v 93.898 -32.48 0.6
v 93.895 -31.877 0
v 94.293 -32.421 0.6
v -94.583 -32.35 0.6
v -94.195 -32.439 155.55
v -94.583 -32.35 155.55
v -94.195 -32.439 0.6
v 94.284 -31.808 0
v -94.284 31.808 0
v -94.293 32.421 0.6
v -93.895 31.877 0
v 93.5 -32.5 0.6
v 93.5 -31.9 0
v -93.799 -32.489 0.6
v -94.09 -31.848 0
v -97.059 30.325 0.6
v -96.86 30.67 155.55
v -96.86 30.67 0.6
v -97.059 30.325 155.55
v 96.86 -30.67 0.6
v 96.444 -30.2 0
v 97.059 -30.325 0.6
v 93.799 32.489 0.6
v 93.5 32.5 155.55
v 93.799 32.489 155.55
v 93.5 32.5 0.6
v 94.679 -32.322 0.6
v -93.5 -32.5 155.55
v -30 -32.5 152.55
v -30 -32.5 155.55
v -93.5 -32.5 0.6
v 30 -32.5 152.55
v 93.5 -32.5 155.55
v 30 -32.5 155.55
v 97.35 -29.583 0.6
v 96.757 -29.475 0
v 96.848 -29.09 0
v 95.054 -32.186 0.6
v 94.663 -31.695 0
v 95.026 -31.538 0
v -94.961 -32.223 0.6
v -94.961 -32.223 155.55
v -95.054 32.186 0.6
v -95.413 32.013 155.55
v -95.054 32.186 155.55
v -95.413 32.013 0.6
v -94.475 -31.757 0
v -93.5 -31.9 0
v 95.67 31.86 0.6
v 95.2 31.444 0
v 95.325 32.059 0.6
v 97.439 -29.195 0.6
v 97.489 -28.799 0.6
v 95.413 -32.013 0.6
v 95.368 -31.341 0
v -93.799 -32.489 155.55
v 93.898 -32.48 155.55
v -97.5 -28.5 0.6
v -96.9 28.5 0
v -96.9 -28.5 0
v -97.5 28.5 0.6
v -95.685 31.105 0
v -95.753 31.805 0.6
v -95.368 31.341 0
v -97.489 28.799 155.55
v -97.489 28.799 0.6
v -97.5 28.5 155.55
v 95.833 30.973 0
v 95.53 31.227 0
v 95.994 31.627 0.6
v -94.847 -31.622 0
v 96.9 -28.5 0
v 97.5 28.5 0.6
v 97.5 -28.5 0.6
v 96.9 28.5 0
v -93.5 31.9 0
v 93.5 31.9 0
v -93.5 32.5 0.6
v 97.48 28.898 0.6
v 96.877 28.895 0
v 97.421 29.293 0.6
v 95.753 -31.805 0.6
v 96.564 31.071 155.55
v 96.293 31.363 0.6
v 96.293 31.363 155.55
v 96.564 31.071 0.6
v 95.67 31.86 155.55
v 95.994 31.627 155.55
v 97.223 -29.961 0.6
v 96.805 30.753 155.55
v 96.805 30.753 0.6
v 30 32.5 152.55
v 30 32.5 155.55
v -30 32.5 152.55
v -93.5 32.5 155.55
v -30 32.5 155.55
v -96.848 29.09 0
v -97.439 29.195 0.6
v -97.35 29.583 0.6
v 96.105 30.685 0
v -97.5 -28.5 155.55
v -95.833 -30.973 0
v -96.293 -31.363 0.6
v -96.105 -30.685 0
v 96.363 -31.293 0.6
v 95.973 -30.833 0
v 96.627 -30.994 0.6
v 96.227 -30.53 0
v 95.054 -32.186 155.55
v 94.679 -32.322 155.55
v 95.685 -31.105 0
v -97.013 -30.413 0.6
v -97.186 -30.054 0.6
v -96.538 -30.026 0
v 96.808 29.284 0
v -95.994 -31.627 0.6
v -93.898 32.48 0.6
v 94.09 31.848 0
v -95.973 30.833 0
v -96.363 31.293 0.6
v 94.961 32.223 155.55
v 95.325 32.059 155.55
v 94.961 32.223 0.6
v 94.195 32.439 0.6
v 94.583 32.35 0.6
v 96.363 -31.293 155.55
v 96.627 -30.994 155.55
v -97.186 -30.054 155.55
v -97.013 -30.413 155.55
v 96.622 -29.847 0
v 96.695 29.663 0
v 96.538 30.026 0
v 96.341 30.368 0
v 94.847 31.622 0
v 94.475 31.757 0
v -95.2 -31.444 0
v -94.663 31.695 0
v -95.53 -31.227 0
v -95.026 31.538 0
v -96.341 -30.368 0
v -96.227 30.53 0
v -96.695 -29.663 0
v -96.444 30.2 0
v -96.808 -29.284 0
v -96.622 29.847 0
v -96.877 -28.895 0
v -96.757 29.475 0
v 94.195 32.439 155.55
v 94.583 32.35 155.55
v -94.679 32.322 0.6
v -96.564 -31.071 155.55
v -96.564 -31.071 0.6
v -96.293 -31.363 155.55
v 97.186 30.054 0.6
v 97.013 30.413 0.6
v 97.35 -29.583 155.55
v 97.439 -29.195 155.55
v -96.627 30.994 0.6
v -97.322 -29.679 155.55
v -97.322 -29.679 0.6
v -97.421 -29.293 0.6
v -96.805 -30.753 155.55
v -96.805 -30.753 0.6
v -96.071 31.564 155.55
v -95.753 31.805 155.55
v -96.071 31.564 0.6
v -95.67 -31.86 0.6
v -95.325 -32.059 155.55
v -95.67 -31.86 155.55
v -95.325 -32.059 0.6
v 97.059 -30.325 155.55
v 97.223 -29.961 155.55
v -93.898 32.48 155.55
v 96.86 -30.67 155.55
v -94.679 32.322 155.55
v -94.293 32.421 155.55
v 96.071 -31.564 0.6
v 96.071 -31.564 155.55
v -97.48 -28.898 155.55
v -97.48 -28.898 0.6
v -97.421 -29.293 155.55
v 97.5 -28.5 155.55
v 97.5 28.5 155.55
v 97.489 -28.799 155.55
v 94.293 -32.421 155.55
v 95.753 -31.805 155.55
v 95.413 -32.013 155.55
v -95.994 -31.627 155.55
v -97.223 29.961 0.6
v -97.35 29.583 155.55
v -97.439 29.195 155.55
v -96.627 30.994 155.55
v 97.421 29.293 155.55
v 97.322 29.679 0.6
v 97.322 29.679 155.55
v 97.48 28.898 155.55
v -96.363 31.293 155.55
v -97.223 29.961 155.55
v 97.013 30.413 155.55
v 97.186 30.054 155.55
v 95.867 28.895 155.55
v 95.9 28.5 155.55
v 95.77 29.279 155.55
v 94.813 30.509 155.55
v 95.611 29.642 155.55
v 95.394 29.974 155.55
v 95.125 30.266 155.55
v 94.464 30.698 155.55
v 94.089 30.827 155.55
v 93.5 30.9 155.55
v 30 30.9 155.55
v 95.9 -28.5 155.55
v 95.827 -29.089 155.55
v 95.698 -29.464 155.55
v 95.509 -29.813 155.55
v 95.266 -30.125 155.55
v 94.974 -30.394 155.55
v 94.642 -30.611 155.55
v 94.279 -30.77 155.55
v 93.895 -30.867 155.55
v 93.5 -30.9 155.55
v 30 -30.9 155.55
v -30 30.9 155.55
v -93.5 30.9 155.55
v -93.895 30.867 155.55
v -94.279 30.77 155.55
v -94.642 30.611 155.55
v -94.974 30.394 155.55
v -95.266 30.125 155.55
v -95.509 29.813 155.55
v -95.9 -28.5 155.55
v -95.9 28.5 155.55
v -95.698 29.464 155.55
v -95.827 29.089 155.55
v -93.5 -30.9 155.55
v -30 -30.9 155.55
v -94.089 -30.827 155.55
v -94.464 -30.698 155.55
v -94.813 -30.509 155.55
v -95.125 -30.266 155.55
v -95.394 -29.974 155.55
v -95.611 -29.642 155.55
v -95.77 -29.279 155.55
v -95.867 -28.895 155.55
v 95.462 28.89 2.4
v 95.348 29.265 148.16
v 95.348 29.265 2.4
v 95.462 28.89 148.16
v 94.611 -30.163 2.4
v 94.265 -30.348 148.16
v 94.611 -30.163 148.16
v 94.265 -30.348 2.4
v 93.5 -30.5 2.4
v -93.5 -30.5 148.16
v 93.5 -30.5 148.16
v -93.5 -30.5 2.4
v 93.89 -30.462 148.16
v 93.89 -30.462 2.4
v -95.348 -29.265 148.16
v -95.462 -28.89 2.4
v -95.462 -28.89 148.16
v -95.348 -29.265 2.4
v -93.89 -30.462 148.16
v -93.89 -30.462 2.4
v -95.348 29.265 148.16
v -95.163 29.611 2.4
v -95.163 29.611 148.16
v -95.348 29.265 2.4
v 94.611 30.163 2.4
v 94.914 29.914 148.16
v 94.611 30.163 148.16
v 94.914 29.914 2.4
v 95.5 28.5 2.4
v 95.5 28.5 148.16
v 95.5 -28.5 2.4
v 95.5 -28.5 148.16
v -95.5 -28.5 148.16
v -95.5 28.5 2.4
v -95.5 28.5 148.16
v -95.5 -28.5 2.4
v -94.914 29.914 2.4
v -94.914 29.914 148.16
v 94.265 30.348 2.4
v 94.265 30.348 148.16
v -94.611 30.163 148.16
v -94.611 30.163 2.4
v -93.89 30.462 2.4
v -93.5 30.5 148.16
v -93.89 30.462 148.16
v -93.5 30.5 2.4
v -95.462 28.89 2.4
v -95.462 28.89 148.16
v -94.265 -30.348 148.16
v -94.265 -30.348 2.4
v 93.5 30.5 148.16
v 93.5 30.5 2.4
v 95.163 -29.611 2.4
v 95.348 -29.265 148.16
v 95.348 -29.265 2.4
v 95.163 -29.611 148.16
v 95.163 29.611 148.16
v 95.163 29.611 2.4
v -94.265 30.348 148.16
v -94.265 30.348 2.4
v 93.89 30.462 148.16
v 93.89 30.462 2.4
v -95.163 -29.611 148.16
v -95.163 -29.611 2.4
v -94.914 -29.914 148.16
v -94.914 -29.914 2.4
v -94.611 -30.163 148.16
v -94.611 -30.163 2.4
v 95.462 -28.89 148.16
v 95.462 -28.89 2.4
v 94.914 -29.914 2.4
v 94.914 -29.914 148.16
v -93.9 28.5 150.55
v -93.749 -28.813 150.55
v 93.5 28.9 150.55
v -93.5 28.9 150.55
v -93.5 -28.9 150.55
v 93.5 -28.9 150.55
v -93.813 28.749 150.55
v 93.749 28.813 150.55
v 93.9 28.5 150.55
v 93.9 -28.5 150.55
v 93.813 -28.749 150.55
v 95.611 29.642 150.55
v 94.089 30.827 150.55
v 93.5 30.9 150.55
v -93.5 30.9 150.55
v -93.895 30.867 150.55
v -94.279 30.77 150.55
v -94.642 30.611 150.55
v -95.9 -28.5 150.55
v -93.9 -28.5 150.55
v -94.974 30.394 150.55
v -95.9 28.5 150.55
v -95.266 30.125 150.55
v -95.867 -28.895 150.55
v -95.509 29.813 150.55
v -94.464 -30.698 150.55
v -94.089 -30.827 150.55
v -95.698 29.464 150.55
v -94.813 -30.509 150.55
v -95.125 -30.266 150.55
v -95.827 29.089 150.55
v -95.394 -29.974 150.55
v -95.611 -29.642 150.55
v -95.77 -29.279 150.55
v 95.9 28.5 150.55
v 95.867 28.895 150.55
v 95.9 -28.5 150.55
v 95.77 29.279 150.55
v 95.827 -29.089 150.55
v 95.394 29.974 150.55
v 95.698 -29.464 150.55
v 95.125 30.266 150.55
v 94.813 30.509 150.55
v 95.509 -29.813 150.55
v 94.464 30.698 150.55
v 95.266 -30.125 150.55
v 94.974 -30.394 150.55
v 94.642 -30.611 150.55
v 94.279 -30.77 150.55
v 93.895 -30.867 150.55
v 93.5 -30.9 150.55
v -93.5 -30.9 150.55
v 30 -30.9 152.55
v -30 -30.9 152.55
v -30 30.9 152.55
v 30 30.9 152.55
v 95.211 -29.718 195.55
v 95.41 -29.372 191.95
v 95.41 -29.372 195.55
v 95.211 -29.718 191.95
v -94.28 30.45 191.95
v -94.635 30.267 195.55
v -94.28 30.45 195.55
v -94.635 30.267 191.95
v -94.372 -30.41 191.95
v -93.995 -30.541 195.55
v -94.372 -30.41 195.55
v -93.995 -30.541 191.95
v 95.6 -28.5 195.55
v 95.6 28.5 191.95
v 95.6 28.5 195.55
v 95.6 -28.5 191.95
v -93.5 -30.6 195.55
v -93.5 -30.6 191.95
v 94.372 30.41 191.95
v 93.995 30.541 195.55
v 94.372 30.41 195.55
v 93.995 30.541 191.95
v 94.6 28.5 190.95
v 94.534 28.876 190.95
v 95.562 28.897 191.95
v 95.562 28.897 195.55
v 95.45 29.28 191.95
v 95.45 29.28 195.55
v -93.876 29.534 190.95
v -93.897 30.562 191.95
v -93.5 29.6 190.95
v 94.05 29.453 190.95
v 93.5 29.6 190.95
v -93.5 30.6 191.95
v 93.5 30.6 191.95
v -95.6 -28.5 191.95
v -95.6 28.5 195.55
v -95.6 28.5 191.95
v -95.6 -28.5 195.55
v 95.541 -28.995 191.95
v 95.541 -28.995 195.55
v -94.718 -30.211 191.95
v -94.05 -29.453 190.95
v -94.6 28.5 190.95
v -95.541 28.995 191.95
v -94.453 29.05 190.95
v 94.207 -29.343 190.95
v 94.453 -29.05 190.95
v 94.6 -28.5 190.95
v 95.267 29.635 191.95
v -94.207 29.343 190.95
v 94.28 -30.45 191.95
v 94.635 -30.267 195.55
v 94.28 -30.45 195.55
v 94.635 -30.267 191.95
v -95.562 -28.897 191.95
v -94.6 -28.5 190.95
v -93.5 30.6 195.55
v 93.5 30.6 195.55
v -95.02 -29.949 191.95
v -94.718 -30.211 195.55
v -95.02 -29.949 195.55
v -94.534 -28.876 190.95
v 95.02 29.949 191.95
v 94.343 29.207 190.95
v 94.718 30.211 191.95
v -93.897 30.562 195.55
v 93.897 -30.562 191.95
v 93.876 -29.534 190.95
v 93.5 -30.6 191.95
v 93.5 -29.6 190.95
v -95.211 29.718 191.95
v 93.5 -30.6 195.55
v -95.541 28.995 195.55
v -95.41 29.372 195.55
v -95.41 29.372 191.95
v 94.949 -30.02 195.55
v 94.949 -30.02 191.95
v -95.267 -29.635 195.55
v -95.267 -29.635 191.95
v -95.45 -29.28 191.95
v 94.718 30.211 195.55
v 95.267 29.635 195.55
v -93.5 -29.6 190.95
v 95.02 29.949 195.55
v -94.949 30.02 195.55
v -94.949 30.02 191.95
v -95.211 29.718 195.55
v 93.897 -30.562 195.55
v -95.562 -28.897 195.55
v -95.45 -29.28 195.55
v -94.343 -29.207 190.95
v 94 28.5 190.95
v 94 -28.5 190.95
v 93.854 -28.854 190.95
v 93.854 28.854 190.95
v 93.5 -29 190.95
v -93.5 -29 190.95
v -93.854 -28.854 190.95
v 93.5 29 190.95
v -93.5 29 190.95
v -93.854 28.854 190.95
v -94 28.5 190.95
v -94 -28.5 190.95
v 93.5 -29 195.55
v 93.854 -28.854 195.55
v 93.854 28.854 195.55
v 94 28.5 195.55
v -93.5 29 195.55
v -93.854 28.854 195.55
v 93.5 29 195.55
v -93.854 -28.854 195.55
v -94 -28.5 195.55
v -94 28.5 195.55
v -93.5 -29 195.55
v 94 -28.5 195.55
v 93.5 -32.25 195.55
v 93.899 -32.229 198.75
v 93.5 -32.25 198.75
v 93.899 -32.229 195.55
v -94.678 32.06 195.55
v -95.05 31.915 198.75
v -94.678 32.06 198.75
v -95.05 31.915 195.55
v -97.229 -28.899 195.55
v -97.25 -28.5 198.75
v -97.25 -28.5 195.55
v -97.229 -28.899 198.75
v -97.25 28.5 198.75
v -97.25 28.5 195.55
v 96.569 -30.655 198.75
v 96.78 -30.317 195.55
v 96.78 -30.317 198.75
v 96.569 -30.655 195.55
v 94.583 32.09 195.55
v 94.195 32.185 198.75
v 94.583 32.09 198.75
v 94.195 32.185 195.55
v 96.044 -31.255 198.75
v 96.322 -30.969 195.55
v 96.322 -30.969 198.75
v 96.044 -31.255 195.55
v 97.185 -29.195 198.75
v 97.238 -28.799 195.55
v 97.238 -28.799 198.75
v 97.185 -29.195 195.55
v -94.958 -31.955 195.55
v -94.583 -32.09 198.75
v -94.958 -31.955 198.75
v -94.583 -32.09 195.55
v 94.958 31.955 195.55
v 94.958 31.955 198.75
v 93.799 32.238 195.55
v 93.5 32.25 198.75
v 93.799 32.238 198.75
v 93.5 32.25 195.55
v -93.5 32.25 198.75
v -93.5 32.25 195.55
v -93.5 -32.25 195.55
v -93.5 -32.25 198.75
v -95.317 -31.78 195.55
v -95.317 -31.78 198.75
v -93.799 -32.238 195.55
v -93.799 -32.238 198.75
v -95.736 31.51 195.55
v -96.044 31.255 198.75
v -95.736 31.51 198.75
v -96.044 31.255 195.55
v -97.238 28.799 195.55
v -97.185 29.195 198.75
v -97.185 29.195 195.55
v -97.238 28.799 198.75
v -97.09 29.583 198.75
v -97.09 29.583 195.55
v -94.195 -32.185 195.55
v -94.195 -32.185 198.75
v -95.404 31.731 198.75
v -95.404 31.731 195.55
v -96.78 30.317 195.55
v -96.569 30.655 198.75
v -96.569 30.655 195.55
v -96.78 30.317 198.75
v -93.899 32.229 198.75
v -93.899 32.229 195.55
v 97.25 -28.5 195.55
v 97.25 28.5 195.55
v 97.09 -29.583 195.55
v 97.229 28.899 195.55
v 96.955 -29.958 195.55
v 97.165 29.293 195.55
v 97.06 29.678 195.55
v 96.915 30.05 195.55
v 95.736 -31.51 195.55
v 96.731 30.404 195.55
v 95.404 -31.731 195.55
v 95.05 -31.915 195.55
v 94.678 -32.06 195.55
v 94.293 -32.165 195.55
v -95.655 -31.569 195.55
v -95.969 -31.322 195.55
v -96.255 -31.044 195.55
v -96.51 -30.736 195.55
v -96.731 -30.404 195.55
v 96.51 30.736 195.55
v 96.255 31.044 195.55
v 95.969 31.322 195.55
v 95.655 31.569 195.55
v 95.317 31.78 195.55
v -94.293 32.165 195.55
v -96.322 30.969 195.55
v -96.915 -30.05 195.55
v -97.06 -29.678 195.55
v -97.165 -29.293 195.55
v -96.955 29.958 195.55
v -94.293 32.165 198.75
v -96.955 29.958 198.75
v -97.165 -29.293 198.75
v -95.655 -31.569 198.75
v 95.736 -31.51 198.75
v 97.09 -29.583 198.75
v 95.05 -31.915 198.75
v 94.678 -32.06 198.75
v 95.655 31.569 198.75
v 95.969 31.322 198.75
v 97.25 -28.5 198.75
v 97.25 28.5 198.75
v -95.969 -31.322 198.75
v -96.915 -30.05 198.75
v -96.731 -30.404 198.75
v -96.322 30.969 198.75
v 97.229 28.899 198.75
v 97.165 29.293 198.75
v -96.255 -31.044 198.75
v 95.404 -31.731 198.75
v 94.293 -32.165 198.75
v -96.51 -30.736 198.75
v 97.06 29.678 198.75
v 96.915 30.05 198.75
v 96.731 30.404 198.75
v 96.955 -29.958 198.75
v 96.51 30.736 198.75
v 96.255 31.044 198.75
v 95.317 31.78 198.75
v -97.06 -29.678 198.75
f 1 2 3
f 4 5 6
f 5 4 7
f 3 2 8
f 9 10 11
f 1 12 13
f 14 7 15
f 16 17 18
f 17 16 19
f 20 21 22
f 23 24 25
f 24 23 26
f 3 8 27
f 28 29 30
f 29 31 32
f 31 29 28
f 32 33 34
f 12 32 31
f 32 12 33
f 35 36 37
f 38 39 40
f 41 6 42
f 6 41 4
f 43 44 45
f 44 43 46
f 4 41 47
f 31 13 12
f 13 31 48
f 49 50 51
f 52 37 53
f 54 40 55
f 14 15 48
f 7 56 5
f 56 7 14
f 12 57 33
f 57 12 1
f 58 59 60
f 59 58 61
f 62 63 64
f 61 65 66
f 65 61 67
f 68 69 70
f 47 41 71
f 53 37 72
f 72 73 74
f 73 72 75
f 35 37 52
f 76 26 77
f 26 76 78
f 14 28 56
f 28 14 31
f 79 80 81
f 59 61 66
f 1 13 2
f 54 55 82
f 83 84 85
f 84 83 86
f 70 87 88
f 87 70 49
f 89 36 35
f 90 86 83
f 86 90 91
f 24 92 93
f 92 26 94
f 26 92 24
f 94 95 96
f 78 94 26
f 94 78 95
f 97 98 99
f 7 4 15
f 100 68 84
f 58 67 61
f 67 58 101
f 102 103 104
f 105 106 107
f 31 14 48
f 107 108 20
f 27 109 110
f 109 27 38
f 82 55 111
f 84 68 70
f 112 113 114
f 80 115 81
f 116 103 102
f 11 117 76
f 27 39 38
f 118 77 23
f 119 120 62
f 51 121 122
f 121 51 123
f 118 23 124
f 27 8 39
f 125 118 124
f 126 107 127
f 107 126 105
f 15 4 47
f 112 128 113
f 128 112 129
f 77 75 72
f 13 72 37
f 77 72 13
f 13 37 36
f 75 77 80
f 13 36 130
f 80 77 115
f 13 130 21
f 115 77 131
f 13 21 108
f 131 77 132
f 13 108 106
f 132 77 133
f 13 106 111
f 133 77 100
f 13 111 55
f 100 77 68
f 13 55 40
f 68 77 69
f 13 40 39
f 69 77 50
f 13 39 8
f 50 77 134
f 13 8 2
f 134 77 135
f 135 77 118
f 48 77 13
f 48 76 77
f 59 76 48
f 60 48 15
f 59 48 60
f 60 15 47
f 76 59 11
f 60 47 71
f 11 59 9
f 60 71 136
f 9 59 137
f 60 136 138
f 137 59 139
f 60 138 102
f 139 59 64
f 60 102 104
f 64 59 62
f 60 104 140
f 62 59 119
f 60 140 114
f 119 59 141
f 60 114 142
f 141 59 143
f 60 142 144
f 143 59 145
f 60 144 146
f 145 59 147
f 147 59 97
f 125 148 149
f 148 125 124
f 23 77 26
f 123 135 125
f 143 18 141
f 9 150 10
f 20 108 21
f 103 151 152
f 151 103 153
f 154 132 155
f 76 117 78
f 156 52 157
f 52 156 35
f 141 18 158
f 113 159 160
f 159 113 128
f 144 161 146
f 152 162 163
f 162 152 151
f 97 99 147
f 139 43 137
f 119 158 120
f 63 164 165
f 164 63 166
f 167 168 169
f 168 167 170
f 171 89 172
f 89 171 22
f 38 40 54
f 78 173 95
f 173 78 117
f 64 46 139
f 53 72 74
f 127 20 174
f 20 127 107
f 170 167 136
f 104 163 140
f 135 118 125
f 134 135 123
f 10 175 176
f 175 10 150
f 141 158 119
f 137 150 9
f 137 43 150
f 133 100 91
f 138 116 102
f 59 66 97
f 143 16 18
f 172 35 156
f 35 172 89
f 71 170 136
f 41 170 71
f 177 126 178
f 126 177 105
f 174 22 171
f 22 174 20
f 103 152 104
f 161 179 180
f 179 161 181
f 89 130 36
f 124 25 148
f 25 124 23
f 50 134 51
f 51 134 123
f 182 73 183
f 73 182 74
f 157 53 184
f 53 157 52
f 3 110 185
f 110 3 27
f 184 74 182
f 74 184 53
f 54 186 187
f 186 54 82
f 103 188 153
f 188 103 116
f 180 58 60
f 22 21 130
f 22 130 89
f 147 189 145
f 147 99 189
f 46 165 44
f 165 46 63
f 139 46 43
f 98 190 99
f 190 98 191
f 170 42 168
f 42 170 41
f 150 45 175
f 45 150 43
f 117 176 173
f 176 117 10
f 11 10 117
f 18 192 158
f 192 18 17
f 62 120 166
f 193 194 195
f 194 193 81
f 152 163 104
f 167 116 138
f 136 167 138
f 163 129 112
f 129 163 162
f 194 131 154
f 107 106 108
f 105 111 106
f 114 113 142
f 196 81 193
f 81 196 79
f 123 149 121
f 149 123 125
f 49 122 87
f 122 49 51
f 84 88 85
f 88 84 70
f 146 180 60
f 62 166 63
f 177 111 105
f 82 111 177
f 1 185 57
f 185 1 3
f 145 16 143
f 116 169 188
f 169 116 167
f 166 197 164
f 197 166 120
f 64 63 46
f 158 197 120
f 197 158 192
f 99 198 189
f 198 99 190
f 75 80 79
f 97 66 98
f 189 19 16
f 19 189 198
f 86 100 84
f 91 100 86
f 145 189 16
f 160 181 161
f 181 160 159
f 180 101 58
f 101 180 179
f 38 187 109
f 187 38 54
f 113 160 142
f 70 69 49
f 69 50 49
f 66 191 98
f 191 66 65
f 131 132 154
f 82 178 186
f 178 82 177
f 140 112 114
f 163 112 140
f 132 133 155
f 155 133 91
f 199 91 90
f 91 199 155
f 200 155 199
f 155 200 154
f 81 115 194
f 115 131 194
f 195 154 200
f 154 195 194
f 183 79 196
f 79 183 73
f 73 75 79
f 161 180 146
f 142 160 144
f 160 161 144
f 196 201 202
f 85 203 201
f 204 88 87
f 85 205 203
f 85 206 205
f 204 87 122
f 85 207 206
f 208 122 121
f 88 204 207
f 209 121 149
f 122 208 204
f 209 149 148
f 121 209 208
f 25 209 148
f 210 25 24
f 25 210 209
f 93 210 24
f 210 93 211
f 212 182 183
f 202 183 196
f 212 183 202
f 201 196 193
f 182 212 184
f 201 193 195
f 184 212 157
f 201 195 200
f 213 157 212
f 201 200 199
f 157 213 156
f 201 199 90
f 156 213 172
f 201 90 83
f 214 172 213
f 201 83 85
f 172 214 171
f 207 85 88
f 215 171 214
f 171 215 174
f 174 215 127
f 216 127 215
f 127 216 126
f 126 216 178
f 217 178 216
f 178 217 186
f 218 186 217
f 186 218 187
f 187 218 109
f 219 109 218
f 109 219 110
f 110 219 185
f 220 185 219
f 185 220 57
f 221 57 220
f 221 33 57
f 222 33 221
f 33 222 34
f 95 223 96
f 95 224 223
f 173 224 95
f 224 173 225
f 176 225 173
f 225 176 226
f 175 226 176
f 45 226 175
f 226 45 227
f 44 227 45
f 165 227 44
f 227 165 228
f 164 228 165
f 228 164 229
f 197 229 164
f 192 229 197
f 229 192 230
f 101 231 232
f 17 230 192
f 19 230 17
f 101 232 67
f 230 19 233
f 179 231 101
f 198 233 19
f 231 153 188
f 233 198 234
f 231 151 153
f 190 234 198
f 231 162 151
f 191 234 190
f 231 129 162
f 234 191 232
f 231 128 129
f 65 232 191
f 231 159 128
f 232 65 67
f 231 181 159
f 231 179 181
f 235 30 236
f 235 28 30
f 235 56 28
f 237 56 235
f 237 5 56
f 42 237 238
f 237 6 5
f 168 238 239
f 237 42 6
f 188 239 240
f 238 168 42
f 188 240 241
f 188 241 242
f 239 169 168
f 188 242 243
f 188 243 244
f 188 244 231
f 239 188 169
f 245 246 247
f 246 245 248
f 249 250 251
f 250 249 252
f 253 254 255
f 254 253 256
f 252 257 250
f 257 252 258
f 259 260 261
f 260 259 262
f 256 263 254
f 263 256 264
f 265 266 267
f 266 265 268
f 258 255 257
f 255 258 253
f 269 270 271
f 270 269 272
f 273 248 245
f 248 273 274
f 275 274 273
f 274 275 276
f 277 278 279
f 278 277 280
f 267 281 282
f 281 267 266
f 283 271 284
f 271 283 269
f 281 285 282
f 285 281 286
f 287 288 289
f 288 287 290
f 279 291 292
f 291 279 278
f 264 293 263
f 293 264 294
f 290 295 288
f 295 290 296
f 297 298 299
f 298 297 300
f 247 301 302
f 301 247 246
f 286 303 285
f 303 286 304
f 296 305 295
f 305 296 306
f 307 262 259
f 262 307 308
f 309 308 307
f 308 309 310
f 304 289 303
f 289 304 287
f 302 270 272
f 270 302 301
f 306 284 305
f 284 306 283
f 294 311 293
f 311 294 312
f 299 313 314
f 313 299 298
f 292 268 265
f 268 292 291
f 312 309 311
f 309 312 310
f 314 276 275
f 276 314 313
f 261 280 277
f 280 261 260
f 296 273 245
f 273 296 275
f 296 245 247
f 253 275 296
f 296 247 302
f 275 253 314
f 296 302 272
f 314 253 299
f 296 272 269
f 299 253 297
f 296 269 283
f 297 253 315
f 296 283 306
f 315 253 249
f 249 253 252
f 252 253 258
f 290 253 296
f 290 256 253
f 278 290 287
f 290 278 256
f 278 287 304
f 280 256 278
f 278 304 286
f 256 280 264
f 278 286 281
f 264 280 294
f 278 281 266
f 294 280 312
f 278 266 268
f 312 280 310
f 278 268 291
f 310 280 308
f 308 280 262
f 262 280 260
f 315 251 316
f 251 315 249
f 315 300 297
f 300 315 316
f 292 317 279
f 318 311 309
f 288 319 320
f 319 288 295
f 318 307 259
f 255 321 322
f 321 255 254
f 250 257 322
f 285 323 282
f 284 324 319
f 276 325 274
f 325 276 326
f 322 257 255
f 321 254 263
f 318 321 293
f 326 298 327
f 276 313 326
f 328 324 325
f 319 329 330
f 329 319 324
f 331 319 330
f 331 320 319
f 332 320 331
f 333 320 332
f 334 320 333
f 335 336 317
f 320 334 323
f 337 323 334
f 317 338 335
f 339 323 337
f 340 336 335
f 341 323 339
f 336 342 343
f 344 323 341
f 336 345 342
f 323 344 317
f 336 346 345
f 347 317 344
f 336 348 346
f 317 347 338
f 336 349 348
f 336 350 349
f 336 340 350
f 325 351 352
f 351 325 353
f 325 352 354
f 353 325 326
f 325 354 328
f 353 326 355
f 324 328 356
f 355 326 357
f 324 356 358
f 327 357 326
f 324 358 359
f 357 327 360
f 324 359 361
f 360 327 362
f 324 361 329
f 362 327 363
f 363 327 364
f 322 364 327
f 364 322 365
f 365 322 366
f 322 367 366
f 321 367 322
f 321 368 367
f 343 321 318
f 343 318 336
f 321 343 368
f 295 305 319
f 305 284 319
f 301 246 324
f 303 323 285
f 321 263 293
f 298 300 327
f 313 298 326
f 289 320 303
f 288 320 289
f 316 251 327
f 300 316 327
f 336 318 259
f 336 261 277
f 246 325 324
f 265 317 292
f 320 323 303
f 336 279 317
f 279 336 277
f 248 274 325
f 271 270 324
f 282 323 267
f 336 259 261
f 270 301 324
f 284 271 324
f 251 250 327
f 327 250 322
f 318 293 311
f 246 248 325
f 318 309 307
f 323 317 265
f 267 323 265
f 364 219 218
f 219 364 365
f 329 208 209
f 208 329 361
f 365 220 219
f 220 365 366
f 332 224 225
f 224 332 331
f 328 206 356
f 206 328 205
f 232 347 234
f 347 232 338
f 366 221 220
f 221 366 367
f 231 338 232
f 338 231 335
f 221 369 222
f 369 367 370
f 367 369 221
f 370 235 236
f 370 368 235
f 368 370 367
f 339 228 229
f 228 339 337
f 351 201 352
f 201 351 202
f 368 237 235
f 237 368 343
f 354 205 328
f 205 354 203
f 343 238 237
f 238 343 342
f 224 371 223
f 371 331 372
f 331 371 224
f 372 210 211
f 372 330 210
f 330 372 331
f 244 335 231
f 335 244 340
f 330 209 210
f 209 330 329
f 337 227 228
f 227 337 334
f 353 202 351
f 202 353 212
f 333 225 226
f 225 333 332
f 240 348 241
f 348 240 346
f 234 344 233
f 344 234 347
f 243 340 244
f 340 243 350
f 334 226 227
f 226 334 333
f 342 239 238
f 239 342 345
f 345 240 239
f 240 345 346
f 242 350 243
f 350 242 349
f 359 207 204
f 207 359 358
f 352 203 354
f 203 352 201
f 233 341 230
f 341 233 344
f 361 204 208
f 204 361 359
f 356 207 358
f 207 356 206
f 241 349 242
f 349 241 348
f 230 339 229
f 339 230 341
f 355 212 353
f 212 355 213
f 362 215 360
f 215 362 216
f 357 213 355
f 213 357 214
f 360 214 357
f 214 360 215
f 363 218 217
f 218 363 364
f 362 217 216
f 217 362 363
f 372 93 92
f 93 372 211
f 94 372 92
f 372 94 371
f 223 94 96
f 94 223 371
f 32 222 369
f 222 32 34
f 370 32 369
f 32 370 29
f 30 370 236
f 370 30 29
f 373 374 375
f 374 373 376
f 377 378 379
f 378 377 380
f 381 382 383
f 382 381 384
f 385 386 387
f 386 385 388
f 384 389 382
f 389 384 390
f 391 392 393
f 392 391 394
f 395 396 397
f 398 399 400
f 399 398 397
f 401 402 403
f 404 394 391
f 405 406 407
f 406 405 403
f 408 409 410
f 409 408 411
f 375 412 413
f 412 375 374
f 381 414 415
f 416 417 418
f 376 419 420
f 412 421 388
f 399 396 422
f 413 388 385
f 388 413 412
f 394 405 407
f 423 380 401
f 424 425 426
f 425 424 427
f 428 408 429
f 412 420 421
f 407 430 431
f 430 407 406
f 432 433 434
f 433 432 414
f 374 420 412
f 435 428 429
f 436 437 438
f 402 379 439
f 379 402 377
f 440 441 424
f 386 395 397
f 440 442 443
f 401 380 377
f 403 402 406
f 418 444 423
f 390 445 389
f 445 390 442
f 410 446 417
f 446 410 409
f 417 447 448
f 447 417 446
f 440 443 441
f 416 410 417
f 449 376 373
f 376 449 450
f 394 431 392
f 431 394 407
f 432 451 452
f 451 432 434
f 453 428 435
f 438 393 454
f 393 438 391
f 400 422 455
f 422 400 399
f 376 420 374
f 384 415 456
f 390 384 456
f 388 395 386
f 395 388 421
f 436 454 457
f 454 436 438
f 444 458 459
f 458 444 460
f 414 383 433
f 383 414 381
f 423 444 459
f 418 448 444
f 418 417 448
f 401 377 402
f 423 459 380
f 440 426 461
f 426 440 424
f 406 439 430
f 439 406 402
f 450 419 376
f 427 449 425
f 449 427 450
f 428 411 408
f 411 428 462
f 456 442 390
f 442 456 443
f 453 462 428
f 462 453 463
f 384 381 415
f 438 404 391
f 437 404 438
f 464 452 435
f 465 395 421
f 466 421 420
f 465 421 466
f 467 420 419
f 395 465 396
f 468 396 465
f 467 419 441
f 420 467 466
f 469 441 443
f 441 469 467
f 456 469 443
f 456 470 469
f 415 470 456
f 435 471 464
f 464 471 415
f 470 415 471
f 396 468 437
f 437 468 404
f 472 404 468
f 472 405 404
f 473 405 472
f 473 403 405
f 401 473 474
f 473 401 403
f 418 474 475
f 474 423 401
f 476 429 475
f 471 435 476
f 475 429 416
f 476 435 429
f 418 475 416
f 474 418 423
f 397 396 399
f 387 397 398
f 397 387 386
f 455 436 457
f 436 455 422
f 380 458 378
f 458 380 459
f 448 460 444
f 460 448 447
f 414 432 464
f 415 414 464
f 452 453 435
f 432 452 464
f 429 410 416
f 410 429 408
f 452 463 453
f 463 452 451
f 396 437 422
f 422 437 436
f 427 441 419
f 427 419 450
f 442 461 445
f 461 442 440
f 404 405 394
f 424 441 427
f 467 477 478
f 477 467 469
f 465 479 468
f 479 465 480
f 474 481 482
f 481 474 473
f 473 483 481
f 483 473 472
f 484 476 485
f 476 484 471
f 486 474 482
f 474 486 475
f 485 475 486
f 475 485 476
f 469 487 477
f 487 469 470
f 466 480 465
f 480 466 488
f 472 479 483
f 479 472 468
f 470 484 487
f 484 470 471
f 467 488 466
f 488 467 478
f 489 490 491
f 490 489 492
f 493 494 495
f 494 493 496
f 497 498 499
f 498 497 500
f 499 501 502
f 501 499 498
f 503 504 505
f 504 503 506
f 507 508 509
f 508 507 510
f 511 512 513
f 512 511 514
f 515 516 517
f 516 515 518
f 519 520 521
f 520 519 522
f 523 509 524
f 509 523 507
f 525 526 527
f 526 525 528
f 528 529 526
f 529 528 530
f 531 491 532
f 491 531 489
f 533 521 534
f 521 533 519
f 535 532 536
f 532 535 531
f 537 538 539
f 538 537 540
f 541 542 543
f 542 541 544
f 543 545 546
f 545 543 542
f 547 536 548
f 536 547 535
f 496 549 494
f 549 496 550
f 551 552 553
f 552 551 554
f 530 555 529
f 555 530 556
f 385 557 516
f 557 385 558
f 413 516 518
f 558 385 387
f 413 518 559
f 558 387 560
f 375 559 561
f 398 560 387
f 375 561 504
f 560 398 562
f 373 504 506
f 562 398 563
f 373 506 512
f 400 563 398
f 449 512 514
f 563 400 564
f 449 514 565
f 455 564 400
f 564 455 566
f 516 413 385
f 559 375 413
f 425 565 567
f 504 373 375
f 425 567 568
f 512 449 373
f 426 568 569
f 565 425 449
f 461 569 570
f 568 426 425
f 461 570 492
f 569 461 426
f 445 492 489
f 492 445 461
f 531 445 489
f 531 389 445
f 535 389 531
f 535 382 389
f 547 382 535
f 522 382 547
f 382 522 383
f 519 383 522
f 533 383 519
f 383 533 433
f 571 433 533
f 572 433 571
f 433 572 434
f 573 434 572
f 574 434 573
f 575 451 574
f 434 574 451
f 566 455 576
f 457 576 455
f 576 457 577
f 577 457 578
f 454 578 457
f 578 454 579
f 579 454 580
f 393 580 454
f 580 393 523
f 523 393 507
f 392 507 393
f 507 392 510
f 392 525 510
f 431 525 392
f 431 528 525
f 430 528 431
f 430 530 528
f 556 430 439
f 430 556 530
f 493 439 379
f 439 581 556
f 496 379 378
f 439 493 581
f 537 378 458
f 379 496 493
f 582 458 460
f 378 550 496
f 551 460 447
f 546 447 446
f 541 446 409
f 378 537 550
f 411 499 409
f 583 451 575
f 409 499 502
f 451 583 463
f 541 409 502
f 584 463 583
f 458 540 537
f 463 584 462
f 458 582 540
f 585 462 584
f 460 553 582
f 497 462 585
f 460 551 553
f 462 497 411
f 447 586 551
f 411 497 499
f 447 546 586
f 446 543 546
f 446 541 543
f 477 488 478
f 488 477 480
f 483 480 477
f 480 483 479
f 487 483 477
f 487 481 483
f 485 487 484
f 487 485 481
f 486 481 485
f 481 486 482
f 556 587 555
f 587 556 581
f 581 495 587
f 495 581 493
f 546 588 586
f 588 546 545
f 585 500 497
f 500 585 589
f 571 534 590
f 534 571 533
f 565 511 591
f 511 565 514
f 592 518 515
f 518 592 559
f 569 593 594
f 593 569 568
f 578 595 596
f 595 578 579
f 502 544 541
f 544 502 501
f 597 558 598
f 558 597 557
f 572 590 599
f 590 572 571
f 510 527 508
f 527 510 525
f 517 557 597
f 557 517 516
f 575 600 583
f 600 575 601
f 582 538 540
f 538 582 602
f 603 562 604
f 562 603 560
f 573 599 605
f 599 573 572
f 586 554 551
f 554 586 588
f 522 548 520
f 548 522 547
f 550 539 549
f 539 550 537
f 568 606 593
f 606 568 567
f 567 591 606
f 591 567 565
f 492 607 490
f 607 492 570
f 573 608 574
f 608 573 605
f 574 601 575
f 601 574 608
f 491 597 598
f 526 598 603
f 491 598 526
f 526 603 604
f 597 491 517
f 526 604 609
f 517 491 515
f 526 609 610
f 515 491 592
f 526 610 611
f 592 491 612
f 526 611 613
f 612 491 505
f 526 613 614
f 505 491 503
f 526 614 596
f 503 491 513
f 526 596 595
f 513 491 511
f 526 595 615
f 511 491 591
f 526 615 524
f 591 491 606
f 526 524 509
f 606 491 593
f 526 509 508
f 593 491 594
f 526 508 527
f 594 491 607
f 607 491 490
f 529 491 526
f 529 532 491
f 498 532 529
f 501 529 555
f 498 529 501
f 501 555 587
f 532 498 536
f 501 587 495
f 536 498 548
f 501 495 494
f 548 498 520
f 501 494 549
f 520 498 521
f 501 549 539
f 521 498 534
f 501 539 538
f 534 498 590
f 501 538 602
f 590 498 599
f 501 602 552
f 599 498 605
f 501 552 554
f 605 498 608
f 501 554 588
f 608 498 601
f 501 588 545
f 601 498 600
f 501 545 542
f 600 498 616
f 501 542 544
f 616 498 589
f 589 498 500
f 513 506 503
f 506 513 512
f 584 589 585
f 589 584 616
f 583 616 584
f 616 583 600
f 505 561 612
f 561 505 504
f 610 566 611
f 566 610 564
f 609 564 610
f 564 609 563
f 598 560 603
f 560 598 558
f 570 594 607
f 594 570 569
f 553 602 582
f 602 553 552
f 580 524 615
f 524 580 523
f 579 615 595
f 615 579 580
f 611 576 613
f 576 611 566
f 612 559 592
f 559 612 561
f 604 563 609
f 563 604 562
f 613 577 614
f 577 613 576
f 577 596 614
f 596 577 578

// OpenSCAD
// photo_box — shipping box for photos, with a proud inset lid
//
// Two parts, single-colour PLA, both print without supports.
//   box  prints open-face-up, floor on the bed
//   lid  prints top-face-down, skirt pointing up
//
// Two boxes, identical but for length — one model, not two designs. A
// change here is a change to both.
//
// The numbers below are the ones to change. Everything else is derived,
// so the model stays coherent at any size.

// ---- variant ----------------------------------------------------------
len_a = 195;      // first box
len_b = 245;      // second box
variant = "a";    // "a" | "b" — which of the two this file emits

// ---- outside envelope (lid on) ----------------------------------------
// HARD CONSTRAINT. No feature on either part may exceed these in any
// axis. Grips and the like are cut *into* the envelope, never added
// outside it. Checked against the exported meshes — see SPEC.md §9.
box_w = (variant == "b") ? len_b : len_a;   // length
box_d = 65;       // depth
box_h = 158.75;   // 6.25"  height, lid seated

// ---- thicknesses ------------------------------------------------------
wall_t  = 2.0;    // side walls        (5 perimeters @ 0.4)
floor_t = 2.4;    // box floor         (6 perimeters)
lid_t   = 3.2;    // lid plate         (8 perimeters)

// ---- lid interface ----------------------------------------------------
rabbet_h = 5.0;   // how far the ledge sits below the rim
ledge_w  = 2.0;   // horizontal width of the ledge
rim_t    = 1.6;   // standing rim above the ledge (4 perimeters)
ramp_h   = 2.4;   // ramp thickening the wall into the rabbet zone. Rises 2.4
                  // while growing 1.6 inward — 34 deg off vertical, so it sits
                  // clear of the 45 deg self-support limit rather than on it.
skirt_w  = 1.6;   // lid skirt thickness (4 perimeters)
clr      = 0.3;   // lateral clearance, skirt to rim (PLA)
seat_gap = 0.4;   // skirt clears the ledge — the rim is the seat, not the ledge

// ---- cosmetic / ergonomic --------------------------------------------
corner_r   = 4.0;  // outside corner radius
lid_relief = 0.25; // lid plate inset from the outer face, per side
skirt_cham = 1.0;  // 45 deg lead-in so the lid self-centres on the way in
foot_cham  = 0.6;  // bottom outer edge — chamfer, not a round (elephant's foot)

// Nail catch: a notch taken out of the BOX rim, front and back, leaving the
// lid edge overhanging a gap you put a fingernail into. Subtractive, so the
// grip costs no envelope.
//
// It is cut from the rim rather than the lid's underside because the plate
// only overhangs the skirt by 1.65 (lid_od/2 - skirt_od/2). Chamfering the
// lid deeper than that removes the plate from under the skirt and leaves the
// skirt bridging nail_w in mid-air. The rim has depth to give; the lid
// does not.
nail_d = 3.0;      // notch depth below the rim top
// Span along the edge. Derived and clamped: the notch must never approach
// the wall's length, or it eats the corners and the rim stops being a
// continuous ring. Inactive at both current lengths (stays 60).
nail_w = min(60.0, box_w - 4 * corner_r);

// ---- output -----------------------------------------------------------
part = "both";     // "box" | "lid" | "both"

$fa = 2;
$fs = 0.4;

// ---- derived ----------------------------------------------------------
body_h   = box_h - lid_t;        // rim top: the lid plate sits on this
ledge_z  = body_h - rabbet_h;    // up-facing ledge surface
ramp_z   = ledge_z - ramp_h;     // where the wall starts thickening
top_wall = rim_t + ledge_w;      // wall thickness through the rabbet zone
skirt_h  = rabbet_h - seat_gap;  // skirt stops short of the ledge

// Rounded-rectangle prism, centred in x/y, rising from z = 0.
module rrect_prism(w, d, r, h) {
    rr = max(min(r, w / 2 - 0.01, d / 2 - 0.01), 0.01);
    linear_extrude(height = h)
        offset(r = rr)
            square([w - 2 * rr, d - 2 * rr], center = true);
}

// ---- box --------------------------------------------------------------

module box_outer() {
    // Chamfered foot, then a straight prism the rest of the way up.
    hull() {
        rrect_prism(box_w - 2 * foot_cham, box_d - 2 * foot_cham,
                    corner_r - foot_cham, 0.01);
        translate([0, 0, foot_cham]) rrect_prism(box_w, box_d, corner_r, 0.01);
    }
    translate([0, 0, foot_cham])
        rrect_prism(box_w, box_d, corner_r, body_h - foot_cham);
}

// The cavity is cut in three stacked pieces. Each one is *wider* than the
// piece below it or tapers into it, so every newly exposed surface faces up
// or sits at 45 deg — nothing to support.
module box_cavity() {
    // Main volume, floor up to the ramp.
    translate([0, 0, floor_t])
        rrect_prism(box_w - 2 * wall_t, box_d - 2 * wall_t,
                    corner_r - wall_t, ramp_z - floor_t + 0.01);

    // 45 deg ramp: the wall thickens inward from wall_t to top_wall, giving
    // the rabbet something solid to be cut out of and hooping the top of a
    // large thin-walled box.
    hull() {
        translate([0, 0, ramp_z])
            rrect_prism(box_w - 2 * wall_t, box_d - 2 * wall_t,
                        corner_r - wall_t, 0.01);
        translate([0, 0, ledge_z - 0.01])
            rrect_prism(box_w - 2 * top_wall, box_d - 2 * top_wall,
                        corner_r - top_wall, 0.01);
    }

    // Rabbet: a wider cut above the ledge leaves the ledge as an up-facing
    // shelf and the rim as a standing fin.
    translate([0, 0, ledge_z])
        rrect_prism(box_w - 2 * rim_t, box_d - 2 * rim_t,
                    corner_r - rim_t, rabbet_h + 1);
}

// Notch through the rim, front and back. Its floor faces up and its walls are
// vertical, so it costs the upright box print nothing. Inboard of the rim is
// already rabbet void, so the cut reaches past it harmlessly.
module nail_catch_cut() {
    for (s = [1, -1])
        translate([0, s * (box_d / 2 - 3), body_h - nail_d / 2 + 1])
            cube([nail_w, 10, nail_d + 2], center = true);
}

module box() {
    difference() {
        box_outer();
        box_cavity();
        nail_catch_cut();
    }
}

// ---- lid --------------------------------------------------------------
// Modelled in the assembled orientation: plate on top, skirt hanging down
// into the rabbet. Flipped for printing at the bottom of the file.

skirt_ow = box_w - 2 * rim_t - 2 * clr;
skirt_od = box_d - 2 * rim_t - 2 * clr;
skirt_or = corner_r - rim_t - clr;
skirt_z0 = body_h - skirt_h;

lid_ow = box_w - 2 * lid_relief;
lid_od = box_d - 2 * lid_relief;

module lid() {
    // Plain plate. The grip lives in the box rim, so nothing is cut from
    // here and the skirt keeps full plate under it.
    translate([0, 0, body_h])
        rrect_prism(lid_ow, lid_od, corner_r - lid_relief, lid_t);

    // Skirt: lateral register only. Its outer face runs against the rim's
    // inner face; a 45 deg lead-in lets it find the opening on the way down.
    difference() {
        union() {
            hull() {
                translate([0, 0, skirt_z0])
                    rrect_prism(skirt_ow - 2 * skirt_cham,
                                skirt_od - 2 * skirt_cham,
                                skirt_or - skirt_cham, 0.01);
                translate([0, 0, skirt_z0 + skirt_cham])
                    rrect_prism(skirt_ow, skirt_od, skirt_or, 0.01);
            }
            translate([0, 0, skirt_z0 + skirt_cham])
                rrect_prism(skirt_ow, skirt_od, skirt_or,
                            skirt_h - skirt_cham + 0.01);
        }
        translate([0, 0, skirt_z0 - 1])
            rrect_prism(skirt_ow - 2 * skirt_w, skirt_od - 2 * skirt_w,
                        skirt_or - skirt_w, skirt_h + 2);
    }
}

// Lid rotated onto its print orientation: visible face down on the bed.
module lid_printed() {
    translate([0, 0, box_h]) rotate([180, 0, 0]) lid();
}

// ---- output -----------------------------------------------------------

if (part == "box") {
    box();
} else if (part == "lid") {
    lid_printed();
} else if (part == "both") {
    // Exploded preview — lid lifted clear so the rabbet is visible.
    box();
    translate([0, 0, 40]) lid();
}
// Any other value emits nothing, so this file can be included and
// section-cut for debugging without drawing the whole model.
